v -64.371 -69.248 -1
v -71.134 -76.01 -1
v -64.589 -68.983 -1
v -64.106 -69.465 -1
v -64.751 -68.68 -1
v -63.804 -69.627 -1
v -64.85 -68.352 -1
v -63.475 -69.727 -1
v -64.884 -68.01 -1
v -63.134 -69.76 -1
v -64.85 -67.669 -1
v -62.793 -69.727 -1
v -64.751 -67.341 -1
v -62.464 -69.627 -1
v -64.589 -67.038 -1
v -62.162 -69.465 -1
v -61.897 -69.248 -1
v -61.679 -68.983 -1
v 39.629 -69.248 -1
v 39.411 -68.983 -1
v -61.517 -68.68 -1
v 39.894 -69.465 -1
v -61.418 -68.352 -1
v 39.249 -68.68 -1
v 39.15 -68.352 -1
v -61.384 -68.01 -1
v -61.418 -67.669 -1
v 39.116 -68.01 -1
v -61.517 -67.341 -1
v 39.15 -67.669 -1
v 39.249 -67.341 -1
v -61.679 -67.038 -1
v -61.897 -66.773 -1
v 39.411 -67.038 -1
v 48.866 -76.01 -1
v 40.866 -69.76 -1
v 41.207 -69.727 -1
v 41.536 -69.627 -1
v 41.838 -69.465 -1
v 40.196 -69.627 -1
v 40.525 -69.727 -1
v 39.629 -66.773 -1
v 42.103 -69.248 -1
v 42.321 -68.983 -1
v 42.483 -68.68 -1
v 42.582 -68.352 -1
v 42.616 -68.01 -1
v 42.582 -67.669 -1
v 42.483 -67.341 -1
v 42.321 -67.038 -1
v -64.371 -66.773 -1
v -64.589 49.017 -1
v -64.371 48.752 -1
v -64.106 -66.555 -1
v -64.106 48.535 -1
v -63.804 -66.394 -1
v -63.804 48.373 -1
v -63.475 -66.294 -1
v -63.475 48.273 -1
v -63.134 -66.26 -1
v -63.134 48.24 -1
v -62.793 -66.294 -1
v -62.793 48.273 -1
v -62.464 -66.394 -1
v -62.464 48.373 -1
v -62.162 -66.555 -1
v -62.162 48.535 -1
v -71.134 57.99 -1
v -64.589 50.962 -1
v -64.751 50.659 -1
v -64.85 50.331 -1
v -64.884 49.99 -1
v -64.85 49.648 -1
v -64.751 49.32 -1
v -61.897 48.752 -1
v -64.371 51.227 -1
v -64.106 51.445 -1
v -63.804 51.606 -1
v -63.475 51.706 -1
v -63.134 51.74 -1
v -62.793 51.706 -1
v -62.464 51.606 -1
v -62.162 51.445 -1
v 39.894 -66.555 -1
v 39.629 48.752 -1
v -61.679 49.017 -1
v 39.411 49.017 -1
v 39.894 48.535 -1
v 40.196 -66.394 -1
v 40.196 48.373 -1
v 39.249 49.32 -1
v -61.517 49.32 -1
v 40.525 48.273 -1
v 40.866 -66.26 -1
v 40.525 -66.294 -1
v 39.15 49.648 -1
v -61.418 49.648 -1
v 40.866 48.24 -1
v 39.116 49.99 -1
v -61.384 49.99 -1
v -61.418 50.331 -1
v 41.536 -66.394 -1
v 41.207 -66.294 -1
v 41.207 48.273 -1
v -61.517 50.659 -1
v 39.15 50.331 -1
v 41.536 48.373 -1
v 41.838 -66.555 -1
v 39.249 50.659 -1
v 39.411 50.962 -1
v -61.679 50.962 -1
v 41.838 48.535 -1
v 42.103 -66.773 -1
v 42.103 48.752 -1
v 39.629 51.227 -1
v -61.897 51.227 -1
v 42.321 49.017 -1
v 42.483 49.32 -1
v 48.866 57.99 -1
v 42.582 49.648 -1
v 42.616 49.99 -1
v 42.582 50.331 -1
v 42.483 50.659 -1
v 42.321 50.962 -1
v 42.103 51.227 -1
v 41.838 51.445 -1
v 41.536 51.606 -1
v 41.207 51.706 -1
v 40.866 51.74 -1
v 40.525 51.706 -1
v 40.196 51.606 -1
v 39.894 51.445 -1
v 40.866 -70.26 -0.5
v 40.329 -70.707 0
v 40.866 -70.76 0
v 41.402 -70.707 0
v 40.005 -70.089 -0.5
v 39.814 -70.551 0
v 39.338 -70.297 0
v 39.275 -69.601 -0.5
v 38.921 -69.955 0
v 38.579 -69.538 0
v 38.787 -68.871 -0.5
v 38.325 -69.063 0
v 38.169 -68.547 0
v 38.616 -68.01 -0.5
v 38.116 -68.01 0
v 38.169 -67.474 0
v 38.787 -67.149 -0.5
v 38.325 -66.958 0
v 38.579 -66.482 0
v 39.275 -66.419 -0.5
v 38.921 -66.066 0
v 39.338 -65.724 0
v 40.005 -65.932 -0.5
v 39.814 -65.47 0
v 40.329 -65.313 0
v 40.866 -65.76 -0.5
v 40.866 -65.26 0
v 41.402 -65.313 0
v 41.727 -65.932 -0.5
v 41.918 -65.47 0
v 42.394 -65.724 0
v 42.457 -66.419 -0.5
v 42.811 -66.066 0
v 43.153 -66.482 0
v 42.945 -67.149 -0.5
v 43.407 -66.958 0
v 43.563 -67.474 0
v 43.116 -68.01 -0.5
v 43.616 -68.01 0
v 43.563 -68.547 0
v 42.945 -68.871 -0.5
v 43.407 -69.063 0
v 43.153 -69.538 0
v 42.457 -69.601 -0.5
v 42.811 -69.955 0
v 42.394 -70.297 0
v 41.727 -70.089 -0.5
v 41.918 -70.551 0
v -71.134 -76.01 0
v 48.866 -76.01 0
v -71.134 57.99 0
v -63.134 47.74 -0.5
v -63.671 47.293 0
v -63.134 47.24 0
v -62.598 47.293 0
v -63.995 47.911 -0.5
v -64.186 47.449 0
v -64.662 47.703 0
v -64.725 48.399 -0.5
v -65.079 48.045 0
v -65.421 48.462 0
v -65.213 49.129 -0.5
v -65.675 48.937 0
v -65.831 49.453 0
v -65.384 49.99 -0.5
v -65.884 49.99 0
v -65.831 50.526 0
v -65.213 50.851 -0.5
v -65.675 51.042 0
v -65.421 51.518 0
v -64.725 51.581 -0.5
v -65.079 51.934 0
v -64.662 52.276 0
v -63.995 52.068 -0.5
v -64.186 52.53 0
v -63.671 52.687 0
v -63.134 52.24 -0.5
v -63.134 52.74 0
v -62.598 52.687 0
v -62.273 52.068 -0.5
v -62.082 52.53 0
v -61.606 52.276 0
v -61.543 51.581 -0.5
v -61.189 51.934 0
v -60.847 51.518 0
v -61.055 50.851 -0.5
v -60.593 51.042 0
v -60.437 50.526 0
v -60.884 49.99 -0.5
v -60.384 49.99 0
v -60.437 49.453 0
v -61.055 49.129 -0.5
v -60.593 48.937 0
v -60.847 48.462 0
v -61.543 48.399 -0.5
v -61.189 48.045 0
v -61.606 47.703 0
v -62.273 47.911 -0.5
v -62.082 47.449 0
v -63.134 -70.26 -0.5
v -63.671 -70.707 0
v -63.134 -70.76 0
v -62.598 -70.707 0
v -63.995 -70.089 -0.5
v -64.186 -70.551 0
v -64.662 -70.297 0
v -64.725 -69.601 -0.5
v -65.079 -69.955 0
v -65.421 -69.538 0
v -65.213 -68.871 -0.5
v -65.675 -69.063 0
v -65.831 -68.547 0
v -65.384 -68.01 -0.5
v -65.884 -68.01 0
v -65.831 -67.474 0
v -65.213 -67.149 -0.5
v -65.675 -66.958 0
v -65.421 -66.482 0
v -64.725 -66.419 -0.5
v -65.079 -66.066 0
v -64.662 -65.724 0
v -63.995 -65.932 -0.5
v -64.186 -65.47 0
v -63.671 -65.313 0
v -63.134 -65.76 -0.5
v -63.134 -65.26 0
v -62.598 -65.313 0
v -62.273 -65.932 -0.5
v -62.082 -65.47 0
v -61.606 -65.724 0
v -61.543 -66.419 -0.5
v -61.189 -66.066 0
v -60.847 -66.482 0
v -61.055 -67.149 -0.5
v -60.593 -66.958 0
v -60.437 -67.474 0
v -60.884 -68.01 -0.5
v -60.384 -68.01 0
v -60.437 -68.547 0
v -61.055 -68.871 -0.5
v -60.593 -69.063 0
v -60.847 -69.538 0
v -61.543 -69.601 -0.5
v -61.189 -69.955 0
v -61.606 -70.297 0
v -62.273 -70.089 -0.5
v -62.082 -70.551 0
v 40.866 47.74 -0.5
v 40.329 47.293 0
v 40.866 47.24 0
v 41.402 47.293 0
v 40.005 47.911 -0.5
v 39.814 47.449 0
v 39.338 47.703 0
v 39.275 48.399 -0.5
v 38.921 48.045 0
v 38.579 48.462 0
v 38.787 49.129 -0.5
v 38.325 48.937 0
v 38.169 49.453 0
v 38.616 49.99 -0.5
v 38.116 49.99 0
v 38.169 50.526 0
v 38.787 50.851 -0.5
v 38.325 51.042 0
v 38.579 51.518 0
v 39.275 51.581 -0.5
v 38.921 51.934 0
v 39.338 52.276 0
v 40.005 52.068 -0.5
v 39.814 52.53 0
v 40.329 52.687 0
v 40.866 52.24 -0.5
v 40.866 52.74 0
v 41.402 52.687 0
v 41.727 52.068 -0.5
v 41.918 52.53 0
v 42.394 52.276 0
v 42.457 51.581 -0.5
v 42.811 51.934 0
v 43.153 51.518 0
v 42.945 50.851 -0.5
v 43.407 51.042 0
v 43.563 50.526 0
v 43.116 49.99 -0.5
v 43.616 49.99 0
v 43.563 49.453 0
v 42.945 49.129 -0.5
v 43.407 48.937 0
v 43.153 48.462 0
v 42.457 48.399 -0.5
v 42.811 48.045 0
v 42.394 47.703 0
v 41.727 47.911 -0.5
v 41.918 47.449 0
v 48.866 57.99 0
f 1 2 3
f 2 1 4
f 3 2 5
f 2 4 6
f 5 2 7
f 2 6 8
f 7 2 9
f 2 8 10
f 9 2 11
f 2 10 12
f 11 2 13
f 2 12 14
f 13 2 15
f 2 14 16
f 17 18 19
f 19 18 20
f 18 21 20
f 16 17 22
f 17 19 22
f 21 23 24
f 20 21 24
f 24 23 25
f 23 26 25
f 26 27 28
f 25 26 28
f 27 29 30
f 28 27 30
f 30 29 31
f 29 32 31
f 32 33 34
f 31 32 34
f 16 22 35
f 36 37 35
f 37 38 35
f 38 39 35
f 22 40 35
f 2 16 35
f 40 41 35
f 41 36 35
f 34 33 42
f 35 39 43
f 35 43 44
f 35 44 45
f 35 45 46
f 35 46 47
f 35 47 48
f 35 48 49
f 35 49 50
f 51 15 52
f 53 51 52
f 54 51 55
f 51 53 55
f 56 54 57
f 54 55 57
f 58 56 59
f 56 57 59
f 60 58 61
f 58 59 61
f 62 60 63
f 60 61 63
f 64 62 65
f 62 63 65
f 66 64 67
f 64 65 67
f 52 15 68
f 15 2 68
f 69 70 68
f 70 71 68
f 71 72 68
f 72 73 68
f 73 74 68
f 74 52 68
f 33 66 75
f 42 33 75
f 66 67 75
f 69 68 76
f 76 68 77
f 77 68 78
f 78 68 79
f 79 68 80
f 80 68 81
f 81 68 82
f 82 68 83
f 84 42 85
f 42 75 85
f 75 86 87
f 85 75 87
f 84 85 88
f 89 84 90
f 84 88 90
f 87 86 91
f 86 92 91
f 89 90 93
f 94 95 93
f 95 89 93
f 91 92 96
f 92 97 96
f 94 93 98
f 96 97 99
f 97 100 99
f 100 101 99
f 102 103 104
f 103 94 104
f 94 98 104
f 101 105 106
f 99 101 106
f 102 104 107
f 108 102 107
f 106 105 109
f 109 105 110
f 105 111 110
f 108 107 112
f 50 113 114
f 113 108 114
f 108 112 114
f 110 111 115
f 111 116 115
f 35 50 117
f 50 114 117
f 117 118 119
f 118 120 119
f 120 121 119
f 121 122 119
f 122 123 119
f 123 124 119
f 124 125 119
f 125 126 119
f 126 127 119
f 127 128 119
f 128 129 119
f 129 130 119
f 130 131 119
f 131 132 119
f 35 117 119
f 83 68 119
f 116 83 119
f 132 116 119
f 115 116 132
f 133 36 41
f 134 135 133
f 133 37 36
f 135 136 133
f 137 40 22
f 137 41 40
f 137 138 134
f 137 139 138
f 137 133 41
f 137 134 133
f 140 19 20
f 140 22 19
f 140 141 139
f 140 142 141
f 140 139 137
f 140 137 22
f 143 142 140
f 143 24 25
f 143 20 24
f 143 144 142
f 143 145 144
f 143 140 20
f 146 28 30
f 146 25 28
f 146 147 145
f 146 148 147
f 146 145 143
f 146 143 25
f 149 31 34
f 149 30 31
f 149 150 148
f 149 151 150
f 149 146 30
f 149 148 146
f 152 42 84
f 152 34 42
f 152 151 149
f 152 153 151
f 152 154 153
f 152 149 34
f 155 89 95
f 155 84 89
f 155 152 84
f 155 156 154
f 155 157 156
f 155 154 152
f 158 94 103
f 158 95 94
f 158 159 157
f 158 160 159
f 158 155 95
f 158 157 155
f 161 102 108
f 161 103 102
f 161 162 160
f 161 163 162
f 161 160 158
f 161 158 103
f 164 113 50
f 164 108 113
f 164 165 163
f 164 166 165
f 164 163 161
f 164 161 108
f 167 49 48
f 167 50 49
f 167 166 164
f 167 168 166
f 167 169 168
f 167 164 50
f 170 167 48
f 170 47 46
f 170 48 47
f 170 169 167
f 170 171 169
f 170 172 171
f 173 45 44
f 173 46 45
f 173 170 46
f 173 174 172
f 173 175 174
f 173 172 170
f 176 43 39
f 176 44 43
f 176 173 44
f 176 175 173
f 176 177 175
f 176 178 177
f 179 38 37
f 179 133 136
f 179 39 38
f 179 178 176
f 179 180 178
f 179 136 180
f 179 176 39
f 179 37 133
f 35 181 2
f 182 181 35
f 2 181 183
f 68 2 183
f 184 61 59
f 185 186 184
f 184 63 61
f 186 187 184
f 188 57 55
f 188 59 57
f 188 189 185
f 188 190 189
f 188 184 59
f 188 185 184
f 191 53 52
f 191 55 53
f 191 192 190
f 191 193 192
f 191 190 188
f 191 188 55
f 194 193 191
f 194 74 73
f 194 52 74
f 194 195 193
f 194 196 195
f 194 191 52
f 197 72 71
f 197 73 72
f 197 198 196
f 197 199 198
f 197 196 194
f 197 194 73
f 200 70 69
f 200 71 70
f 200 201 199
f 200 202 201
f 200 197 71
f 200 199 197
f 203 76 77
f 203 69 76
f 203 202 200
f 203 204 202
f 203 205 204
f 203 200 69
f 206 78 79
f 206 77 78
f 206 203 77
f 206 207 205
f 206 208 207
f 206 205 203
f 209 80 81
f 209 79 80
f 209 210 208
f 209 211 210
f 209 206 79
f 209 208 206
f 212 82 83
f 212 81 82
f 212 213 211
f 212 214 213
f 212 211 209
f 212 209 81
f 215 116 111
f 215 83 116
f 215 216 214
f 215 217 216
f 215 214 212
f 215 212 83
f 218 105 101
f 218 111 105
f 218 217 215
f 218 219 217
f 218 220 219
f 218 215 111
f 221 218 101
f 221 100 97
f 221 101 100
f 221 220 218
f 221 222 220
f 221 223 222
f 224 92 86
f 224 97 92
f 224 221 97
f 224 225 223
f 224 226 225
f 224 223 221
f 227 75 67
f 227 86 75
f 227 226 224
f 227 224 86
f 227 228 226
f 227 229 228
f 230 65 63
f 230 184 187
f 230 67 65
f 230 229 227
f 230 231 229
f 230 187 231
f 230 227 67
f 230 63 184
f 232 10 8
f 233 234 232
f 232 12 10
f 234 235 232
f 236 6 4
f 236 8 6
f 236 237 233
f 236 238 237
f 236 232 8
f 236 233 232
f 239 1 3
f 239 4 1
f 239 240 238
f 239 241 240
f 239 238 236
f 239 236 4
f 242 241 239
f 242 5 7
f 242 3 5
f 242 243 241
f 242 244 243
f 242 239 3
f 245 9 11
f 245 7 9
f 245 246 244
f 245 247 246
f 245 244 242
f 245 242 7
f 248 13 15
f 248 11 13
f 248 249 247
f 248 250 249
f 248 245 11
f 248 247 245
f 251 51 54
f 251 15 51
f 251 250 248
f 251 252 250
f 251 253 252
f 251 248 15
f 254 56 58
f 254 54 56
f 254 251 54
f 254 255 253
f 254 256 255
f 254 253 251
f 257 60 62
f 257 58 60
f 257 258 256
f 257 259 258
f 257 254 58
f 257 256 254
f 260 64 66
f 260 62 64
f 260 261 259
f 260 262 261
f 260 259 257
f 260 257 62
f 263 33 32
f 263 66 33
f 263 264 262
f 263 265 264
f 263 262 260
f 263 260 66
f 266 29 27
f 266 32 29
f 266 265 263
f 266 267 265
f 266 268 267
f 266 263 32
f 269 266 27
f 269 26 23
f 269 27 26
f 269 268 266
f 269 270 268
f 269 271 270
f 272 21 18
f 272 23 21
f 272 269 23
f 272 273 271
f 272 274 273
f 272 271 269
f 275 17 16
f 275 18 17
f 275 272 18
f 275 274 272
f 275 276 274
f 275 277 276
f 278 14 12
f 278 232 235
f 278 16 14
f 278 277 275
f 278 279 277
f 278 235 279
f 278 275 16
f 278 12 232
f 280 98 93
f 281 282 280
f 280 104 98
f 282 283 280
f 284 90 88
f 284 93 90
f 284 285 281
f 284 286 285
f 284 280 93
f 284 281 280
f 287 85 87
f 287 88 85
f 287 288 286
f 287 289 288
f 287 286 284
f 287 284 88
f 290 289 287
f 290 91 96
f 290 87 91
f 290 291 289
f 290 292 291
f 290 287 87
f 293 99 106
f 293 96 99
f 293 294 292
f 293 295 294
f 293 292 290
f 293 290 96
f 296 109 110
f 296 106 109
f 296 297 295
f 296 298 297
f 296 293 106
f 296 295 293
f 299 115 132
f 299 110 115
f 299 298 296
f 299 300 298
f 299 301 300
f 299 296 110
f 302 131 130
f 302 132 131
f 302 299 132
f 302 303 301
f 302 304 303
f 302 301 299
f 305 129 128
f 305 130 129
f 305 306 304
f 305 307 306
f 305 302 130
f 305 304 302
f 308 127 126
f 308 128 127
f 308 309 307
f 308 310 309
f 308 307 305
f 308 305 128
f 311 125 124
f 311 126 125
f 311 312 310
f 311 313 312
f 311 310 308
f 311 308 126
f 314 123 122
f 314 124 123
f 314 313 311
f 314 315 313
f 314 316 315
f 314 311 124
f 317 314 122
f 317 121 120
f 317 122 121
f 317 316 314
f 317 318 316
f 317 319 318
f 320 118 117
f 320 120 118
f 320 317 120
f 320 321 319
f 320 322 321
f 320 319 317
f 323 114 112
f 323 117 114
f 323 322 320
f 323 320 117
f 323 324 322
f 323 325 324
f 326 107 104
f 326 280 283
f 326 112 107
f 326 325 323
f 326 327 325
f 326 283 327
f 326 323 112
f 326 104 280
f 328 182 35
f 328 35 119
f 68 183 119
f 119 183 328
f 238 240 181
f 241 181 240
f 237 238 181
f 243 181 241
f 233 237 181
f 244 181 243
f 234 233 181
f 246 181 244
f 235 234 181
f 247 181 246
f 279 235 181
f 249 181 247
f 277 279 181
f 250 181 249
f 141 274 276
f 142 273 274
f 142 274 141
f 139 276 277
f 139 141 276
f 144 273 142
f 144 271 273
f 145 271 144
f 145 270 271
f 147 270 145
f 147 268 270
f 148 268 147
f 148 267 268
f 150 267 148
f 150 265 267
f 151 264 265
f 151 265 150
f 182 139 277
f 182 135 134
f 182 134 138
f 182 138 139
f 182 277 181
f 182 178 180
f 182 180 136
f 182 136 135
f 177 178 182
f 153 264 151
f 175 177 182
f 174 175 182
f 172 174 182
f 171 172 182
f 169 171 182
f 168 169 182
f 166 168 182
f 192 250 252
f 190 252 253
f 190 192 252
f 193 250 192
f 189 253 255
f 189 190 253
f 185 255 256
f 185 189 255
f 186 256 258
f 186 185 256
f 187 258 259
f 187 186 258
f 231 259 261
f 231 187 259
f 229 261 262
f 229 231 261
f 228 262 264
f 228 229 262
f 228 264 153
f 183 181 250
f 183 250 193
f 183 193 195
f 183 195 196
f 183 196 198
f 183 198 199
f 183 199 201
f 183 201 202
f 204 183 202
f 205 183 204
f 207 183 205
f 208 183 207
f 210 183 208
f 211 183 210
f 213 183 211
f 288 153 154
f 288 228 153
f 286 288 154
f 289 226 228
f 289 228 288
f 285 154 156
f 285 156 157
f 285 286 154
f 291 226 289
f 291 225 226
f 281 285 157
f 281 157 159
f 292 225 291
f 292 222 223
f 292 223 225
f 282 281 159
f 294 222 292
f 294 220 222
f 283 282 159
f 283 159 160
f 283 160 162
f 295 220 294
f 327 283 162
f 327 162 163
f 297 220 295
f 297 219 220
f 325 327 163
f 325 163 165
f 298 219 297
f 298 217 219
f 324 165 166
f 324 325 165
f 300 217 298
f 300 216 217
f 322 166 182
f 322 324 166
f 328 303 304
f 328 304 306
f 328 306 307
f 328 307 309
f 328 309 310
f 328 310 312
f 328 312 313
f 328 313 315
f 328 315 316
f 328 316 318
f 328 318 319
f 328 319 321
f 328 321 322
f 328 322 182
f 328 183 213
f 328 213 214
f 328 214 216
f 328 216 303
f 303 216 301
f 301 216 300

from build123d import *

# Parameters (mm, degrees)
SKETCH1_W                                      = 120
SKETCH1_H                                      = 134
BOSS_EXTRUDE2_DEPTH                            = 1
CSK_FOR_M2_5_COUNTERSUNK_FLAT_HEAD1_AT_2_COUNT = 2
CSK_FOR_M2_5_COUNTERSUNK_FLAT_HEAD1_AT_2_PITCH = 118
CSK_FOR_M2_5_COUNTERSUNK_FLAT_HEAD1_AT_3_COUNT = 2
CSK_FOR_M2_5_COUNTERSUNK_FLAT_HEAD1_AT_3_PITCH = 157.289541928
CSK_FOR_M2_5_COUNTERSUNK_FLAT_HEAD1_AT_4_COUNT = 2
CSK_FOR_M2_5_COUNTERSUNK_FLAT_HEAD1_AT_4_PITCH = 104


with BuildPart() as part:
    # Sketch1 → Boss-Extrude2 (new body)
    with BuildSketch(Plane.XY):
        with Locations((-11.134020619, -9.010309278)):
            Rectangle(SKETCH1_W, SKETCH1_H)
    extrude(amount=-BOSS_EXTRUDE2_DEPTH)

    # Sketch4 → CSK for M2.5 Countersunk Flat Head1 (revolve, cut)
    with BuildSketch(Plane(origin=(-63.134020619, 49.989690722, 0), x_dir=(0, -1, 0), z_dir=(1, 0, 0))):
        Polygon((0, 0), (0, 1.871247898), (1.45, 1), (1.45, 1.3), (2.75, 0), align=None)
    csk_for_m2_5_countersunk_flat_head1 = revolve(axis=Axis((-63.134020619, 49.989690722, 6.35), (0, 0, -1)), mode=Mode.SUBTRACT)

    # CSK for M2.5 Countersunk Flat Head1 at 2: CSK for M2.5 Countersunk Flat Head1 ×2
    with Locations(*[(0, -i * CSK_FOR_M2_5_COUNTERSUNK_FLAT_HEAD1_AT_2_PITCH, 0) for i in range(1, CSK_FOR_M2_5_COUNTERSUNK_FLAT_HEAD1_AT_2_COUNT)]):
        add(csk_for_m2_5_countersunk_flat_head1, mode=Mode.SUBTRACT)

    # CSK for M2.5 Countersunk Flat Head1 at 3: CSK for M2.5 Countersunk Flat Head1 ×2
    with Locations(*[Vector(0.661200984662022, -0.7502088095203712, 0) * (i * CSK_FOR_M2_5_COUNTERSUNK_FLAT_HEAD1_AT_3_PITCH) for i in range(1, CSK_FOR_M2_5_COUNTERSUNK_FLAT_HEAD1_AT_3_COUNT)]):
        add(csk_for_m2_5_countersunk_flat_head1, mode=Mode.SUBTRACT)

    # CSK for M2.5 Countersunk Flat Head1 at 4: CSK for M2.5 Countersunk Flat Head1 ×2
    with Locations(*[(i * CSK_FOR_M2_5_COUNTERSUNK_FLAT_HEAD1_AT_4_PITCH, 0, 0) for i in range(1, CSK_FOR_M2_5_COUNTERSUNK_FLAT_HEAD1_AT_4_COUNT)]):
        add(csk_for_m2_5_countersunk_flat_head1, mode=Mode.SUBTRACT)


solid = part.part
